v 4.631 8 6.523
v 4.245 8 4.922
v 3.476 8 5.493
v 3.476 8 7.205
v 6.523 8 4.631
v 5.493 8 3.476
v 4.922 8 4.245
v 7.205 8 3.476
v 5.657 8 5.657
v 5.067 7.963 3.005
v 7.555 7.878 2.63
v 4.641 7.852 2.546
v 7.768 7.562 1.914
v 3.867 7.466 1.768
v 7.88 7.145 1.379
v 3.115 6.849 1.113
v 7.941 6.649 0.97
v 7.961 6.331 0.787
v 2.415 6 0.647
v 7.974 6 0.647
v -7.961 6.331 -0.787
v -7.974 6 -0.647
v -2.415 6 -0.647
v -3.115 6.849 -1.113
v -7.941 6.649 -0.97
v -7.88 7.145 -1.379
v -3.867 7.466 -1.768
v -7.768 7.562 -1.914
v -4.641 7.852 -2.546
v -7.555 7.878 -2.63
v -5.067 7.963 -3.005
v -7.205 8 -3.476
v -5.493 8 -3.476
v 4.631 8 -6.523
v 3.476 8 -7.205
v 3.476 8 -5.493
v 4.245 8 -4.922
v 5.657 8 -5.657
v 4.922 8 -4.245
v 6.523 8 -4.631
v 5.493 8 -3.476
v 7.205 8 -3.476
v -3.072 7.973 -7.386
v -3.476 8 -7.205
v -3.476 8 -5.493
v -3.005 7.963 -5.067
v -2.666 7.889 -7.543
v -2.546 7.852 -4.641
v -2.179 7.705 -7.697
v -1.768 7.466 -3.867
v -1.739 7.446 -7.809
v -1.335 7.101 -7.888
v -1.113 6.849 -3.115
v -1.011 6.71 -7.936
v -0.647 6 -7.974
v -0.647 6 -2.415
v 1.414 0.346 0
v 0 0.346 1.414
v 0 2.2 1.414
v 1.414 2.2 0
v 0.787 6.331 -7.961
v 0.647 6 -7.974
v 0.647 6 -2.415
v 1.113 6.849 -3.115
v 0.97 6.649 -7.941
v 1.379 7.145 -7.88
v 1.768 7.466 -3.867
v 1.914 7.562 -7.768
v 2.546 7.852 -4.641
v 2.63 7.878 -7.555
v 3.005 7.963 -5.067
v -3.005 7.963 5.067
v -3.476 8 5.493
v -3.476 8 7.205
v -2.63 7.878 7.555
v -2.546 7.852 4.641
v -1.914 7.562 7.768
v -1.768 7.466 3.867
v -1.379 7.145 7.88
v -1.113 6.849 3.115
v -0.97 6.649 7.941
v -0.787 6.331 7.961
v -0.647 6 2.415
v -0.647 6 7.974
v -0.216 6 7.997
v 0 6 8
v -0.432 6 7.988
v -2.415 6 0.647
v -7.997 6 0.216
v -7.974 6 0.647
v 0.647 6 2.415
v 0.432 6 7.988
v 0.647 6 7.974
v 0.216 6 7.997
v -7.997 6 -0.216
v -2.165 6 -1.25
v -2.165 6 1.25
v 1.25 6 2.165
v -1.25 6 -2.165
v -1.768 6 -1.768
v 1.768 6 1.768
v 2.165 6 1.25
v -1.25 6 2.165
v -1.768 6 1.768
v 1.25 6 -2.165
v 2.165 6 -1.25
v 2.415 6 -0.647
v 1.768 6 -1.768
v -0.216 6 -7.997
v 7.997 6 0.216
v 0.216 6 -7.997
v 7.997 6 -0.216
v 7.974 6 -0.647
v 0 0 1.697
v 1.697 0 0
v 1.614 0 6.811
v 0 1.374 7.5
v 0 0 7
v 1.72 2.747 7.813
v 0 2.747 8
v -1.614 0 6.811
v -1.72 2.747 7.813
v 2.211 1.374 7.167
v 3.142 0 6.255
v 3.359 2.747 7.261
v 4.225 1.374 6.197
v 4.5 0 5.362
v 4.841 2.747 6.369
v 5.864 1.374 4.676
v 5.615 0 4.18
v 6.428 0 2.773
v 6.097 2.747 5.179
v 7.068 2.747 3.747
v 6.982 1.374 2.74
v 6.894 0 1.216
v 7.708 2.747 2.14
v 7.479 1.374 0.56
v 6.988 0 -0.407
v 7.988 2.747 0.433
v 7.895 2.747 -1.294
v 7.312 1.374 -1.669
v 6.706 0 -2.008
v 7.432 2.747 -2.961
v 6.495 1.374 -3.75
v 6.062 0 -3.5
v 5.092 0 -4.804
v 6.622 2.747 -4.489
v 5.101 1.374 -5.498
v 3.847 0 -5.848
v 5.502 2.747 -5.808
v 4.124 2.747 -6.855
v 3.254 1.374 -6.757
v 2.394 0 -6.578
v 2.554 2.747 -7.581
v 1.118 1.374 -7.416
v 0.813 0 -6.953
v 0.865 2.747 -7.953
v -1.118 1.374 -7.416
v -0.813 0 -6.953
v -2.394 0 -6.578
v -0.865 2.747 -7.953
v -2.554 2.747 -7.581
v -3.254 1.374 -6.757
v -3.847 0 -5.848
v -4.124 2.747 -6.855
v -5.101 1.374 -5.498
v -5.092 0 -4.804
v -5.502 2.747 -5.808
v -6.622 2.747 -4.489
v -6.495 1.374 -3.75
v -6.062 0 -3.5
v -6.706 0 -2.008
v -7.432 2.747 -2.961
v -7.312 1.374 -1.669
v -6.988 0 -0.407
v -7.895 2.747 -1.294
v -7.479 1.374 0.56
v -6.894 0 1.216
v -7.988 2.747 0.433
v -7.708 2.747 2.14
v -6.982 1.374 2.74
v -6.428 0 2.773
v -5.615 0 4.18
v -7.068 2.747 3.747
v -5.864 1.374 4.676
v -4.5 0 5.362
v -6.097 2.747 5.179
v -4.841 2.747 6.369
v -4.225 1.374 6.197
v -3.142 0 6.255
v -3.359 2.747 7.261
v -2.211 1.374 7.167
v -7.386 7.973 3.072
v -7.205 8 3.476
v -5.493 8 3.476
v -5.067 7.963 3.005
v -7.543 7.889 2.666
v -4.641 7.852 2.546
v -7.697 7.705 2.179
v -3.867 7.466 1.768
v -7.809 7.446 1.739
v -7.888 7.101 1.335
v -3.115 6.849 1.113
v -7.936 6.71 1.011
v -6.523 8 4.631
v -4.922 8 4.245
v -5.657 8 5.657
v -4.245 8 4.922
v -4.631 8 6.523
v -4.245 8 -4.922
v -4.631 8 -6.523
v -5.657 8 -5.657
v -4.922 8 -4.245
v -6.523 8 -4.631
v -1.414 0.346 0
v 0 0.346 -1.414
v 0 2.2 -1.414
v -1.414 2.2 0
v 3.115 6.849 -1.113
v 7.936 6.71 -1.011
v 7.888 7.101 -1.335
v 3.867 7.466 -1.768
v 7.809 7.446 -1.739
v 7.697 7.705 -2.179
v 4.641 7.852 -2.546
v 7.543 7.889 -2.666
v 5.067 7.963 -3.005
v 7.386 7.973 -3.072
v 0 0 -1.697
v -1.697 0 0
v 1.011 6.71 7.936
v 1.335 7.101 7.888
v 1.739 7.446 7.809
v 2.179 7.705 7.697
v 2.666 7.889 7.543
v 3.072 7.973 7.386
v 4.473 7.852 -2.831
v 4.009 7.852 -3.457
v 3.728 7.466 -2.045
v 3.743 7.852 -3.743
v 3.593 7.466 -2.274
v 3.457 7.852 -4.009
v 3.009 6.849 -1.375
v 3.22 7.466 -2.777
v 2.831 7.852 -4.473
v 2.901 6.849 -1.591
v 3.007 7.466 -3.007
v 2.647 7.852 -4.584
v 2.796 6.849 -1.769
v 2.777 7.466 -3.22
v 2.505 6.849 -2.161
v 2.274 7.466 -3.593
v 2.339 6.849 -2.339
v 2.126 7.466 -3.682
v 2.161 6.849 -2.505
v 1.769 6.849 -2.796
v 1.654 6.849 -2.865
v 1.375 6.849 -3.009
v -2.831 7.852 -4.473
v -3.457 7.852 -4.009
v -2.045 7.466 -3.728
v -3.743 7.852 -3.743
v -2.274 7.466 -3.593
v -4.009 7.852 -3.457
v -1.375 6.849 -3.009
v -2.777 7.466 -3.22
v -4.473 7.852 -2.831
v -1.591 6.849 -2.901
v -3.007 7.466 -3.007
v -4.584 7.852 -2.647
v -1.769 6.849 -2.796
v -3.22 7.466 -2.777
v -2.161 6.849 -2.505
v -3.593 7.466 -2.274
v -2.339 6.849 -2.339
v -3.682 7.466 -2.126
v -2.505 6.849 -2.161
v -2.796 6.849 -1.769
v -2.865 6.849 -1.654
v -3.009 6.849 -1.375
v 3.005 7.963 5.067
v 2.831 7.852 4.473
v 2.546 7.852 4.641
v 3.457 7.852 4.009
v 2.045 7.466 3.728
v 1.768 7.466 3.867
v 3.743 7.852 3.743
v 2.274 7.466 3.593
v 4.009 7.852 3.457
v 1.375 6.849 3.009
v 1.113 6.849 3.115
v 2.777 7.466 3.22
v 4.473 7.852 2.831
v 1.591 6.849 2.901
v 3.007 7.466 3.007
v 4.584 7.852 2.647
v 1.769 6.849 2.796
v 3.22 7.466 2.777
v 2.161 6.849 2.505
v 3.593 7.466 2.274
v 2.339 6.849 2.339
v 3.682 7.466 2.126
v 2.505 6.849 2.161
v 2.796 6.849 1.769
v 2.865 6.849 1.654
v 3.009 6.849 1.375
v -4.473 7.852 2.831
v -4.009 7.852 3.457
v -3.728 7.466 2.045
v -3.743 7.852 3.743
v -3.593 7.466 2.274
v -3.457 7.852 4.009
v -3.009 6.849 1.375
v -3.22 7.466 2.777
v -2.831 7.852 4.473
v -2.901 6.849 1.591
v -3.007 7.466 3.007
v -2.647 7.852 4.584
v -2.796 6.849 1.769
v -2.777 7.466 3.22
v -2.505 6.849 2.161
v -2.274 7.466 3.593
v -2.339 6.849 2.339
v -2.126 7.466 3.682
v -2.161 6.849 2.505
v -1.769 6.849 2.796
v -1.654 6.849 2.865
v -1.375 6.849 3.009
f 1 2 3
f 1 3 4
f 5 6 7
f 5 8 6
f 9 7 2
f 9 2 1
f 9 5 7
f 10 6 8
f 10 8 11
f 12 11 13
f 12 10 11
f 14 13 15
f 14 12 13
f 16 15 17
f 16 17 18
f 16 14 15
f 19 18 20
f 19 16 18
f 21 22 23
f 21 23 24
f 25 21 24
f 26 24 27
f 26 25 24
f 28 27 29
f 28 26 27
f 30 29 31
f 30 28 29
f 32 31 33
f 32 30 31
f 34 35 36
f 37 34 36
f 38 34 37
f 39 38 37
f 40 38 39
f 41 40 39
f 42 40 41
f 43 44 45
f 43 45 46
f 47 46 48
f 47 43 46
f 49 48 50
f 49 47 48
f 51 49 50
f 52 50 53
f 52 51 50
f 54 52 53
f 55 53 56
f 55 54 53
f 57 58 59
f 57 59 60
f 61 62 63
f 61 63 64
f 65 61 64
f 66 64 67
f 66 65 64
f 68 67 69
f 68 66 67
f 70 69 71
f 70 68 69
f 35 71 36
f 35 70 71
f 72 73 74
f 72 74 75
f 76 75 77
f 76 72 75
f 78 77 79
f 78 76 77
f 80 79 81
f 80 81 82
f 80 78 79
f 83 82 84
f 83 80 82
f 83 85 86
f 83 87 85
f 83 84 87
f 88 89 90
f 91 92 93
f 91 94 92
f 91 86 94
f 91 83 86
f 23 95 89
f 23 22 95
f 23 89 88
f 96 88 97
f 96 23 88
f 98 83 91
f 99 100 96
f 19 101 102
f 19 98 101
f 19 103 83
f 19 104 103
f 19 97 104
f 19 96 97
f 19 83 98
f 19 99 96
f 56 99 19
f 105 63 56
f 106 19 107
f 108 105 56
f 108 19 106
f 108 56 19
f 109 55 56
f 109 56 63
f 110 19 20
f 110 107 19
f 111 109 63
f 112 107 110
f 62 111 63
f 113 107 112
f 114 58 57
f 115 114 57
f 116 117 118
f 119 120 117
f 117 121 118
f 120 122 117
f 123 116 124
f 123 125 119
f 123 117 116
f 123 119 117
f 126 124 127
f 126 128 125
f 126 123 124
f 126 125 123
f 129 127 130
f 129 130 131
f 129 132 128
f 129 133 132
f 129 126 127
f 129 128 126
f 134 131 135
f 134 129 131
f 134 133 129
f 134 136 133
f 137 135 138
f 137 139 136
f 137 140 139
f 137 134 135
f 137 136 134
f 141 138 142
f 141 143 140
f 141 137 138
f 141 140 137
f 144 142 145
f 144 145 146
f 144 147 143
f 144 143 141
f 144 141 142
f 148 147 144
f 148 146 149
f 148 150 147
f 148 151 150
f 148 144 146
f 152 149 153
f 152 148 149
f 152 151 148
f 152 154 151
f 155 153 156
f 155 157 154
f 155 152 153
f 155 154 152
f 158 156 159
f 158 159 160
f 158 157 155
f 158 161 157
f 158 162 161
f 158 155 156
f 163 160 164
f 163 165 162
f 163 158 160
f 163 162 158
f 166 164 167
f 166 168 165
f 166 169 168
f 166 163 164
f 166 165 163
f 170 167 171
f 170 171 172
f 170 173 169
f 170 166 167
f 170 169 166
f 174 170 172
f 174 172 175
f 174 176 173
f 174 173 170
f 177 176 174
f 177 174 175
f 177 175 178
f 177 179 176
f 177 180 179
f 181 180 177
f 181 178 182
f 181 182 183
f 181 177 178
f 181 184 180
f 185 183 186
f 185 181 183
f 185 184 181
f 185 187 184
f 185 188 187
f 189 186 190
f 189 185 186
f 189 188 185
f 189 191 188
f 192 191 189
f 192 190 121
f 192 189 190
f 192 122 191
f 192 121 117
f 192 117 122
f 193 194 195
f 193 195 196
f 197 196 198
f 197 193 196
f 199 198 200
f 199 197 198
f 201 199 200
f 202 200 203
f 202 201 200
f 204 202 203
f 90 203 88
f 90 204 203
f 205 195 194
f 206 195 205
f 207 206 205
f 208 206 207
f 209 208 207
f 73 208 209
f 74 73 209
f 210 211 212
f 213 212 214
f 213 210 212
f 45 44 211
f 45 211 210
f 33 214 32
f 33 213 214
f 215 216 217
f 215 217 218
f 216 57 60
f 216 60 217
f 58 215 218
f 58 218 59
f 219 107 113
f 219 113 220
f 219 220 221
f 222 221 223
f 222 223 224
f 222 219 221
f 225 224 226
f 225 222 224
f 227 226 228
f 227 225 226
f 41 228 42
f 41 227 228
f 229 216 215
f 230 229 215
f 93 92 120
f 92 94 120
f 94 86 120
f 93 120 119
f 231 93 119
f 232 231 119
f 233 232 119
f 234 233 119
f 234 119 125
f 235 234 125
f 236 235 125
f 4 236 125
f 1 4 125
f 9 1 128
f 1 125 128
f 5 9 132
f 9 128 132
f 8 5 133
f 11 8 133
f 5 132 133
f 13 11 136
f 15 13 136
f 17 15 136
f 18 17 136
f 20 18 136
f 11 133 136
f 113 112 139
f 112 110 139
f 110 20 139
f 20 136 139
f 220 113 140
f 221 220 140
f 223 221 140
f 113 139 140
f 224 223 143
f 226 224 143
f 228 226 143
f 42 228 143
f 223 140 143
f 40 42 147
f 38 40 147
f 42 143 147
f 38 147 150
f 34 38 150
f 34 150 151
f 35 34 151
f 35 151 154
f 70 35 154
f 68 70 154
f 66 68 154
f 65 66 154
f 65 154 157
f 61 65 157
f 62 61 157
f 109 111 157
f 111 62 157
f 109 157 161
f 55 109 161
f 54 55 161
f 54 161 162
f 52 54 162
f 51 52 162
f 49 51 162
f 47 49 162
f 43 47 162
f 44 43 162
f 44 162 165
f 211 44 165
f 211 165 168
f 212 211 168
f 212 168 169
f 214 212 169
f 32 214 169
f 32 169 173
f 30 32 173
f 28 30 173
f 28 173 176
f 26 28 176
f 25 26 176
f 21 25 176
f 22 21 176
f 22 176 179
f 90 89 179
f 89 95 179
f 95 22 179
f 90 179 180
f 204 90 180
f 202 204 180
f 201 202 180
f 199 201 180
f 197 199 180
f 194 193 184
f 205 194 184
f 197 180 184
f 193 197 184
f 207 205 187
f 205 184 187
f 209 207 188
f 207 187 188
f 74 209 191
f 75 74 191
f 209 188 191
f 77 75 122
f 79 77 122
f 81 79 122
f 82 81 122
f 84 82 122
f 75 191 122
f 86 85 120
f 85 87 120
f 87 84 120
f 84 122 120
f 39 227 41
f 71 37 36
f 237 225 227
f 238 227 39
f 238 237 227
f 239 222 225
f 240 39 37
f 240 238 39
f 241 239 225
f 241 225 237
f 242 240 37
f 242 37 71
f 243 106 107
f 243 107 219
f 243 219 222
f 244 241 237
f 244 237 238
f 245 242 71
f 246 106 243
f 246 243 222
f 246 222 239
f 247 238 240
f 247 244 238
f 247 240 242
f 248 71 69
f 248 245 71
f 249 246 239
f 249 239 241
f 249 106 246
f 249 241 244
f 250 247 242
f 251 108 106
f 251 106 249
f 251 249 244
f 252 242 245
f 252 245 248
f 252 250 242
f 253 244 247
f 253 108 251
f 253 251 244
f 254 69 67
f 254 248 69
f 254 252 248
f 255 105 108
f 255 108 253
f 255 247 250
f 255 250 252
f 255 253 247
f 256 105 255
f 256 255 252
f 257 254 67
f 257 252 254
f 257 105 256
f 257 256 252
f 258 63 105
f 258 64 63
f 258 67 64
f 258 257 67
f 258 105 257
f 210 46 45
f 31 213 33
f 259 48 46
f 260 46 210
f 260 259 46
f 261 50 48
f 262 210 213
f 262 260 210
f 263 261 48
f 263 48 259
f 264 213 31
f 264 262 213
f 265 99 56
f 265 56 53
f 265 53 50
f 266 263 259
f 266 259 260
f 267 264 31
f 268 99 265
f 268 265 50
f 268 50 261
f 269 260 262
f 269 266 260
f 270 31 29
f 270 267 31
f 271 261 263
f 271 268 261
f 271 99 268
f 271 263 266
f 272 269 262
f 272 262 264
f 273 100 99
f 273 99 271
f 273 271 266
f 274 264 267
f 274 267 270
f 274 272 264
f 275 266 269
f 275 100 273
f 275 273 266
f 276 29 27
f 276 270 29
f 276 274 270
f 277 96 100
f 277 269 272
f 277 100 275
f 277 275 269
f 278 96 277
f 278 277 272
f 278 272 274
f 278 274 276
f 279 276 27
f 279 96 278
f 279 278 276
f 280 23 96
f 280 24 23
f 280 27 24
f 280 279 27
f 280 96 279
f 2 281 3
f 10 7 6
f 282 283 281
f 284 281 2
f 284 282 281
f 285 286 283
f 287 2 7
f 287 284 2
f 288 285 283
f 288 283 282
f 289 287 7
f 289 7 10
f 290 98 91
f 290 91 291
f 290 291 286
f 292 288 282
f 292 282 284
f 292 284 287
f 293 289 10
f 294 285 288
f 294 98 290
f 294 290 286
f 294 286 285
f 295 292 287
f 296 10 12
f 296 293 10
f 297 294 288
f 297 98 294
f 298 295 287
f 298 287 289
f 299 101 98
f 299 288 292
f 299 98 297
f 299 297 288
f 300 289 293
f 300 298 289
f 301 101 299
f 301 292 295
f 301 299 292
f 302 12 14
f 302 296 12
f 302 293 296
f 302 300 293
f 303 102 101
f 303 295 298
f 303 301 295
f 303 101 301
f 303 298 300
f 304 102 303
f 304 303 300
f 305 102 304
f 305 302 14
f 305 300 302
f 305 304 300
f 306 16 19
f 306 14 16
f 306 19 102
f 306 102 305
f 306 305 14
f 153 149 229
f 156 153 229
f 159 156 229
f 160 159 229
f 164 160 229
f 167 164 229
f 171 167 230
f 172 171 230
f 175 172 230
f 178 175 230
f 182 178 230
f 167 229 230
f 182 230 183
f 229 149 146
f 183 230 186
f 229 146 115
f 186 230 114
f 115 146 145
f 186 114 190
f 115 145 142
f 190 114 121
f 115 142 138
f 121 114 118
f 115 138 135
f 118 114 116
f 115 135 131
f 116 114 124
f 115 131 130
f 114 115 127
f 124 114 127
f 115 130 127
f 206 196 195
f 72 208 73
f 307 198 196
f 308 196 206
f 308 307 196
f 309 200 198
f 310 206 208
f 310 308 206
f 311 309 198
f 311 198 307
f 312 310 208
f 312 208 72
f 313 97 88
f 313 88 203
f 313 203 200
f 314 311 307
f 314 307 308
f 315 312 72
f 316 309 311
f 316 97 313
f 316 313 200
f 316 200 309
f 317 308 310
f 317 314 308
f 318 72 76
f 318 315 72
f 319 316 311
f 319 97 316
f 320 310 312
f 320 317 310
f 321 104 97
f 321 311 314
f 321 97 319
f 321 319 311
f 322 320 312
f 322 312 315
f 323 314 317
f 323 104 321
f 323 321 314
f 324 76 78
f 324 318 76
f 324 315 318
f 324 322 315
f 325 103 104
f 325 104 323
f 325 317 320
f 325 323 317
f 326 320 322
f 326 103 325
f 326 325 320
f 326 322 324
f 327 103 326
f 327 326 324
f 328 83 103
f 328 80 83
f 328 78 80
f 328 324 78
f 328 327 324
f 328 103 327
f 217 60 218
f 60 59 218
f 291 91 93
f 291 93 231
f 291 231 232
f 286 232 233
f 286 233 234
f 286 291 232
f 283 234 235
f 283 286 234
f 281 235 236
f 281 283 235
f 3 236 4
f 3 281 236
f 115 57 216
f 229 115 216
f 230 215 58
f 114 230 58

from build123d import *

# Parameters (mm, degrees)
SKETCH3_R           = 8
BOSS_EXTRUDE3_DEPTH = 8
CUT_EXTRUDE2_DEPTH  = 2
CUT_EXTRUDE2_DRAFT  = -10
SKETCH7_R           = 2.5
CUT_EXTRUDE4_DEPTH  = 2
FILLET1_R           = 5
FILLET2_START       = -9
FILLET2_DEPTH       = 18
FILLET2_2_DEPTH     = 18
CUT_EXTRUDE5_DEPTH  = 2.2
CHAMFER2_SIZE       = 0.2
CHAMFER2_SIZE2      = 0.346410162
CHAMFER3_SIZE       = 1
CHAMFER3_SIZE2      = 2.747477419


with BuildPart() as part:
    # Sketch3 → Boss-Extrude3 (new body)
    with BuildSketch(Plane(origin=(0, 0, 0), x_dir=(1, 0, 0), z_dir=(0, 1, 0))):
        with Locations(Location((0, 0, 0), (0, 0, 270))):
            Circle(SKETCH3_R)
    extrude(amount=BOSS_EXTRUDE3_DEPTH)


with BuildPart() as cut_extrude2_tool:
    # Sketch4 → Cut-Extrude2 (with draft: the straight prism first)
    with BuildSketch(Plane(origin=(0, 8, 0), x_dir=(1, 0, 0), z_dir=(0, 1, 0))):
        Polygon((-9, -1), (-1, -1), (-1, -9), (1, -9), (1, -1), (9, -1), (9, 1), (1, 1), (1, 9), (-1, 9), (-1, 1), (-9, 1), align=None)
    extrude(amount=-CUT_EXTRUDE2_DEPTH)
    # Cut-Extrude2: the draft: its side faces are tilted about the plane it starts from
    cut_extrude2_sides = [cut_extrude2_tool.faces().sort_by_distance(p)[0] for p in [
        (-5, 7, 1),
        (-1, 7, 5),
        (0, 7, 9),
        (1, 7, 5),
        (5, 7, 1),
        (9, 7, 0),
        (5, 7, -1),
        (1, 7, -5),
        (0, 7, -9),
        (-1, 7, -5),
        (-5, 7, -1),
        (-9, 7, 0),
    ]]
    draft(cut_extrude2_sides, Plane(origin=(0, 8, 0), x_dir=(1, 0, 0), z_dir=(0, 1, 0)), CUT_EXTRUDE2_DRAFT)


with BuildPart() as part_1:
    add(part.part)

    # Cut-Extrude2: cut by cut_extrude2_tool
    add(cut_extrude2_tool.part, mode=Mode.SUBTRACT)

    # Sketch7 → Cut-Extrude4 (cut)
    with BuildSketch(Plane(origin=(0, 8, 0), x_dir=(1, 0, 0), z_dir=(0, 1, 0))):
        Circle(SKETCH7_R)
    extrude(amount=-CUT_EXTRUDE4_DEPTH, mode=Mode.SUBTRACT)

    # Fillet1
    # the kernel refuses this fillet: 5 mm, written as the material it takes off along each edge
    with BuildSketch(Plane(origin=(0, 8, 0), x_dir=(-0.7093247295722765, 0, -0.7048818539423588), z_dir=(0.7048818539423588, 0, -0.7093247295722765))) as fillet1_piece_1:
        with BuildLine():
            CenterArc((6.5, -5), FILLET1_R, 90, 53.130102354)
            Line((2.5, -2), (2.42, -1.94))
            ThreePointArc((2.42, -1.94), (2.4, -1), (2.4, 0))
            Line((2.4, 0), (2.5, 0.1))
            Line((2.5, 0.1), (6.5, 0.1))
            Line((6.5, 0.1), (6.5, 0))
        make_face()
    revolve(axis=Axis((0, 8, 0), (0, 1, 0)), revolution_arc=359.64, mode=Mode.SUBTRACT)
    with BuildSketch(Plane(origin=(0, 8, 0), x_dir=(0.7048818539423484, 0, -0.7093247295722869), z_dir=(0.7093247295722869, 0, 0.7048818539423484))) as fillet1_piece_2:
        with BuildLine():
            CenterArc((6.5, -5), FILLET1_R, 90, 53.130102354)
            Line((2.5, -2), (2.42, -1.94))
            ThreePointArc((2.42, -1.94), (2.4, -1), (2.4, 0))
            Line((2.4, 0), (2.5, 0.1))
            Line((2.5, 0.1), (6.5, 0.1))
            Line((6.5, 0.1), (6.5, 0))
        make_face()
    revolve(axis=Axis((0, 8, 0), (0, 1, 0)), revolution_arc=359.64, mode=Mode.SUBTRACT)
    with BuildSketch(Plane(origin=(0, 8, 0), x_dir=(0.7093247295722607, 0, 0.7048818539423748), z_dir=(-0.7048818539423748, 0, 0.7093247295722607))) as fillet1_piece_3:
        with BuildLine():
            CenterArc((6.5, -5), FILLET1_R, 90, 53.130102354)
            Line((2.5, -2), (2.42, -1.94))
            ThreePointArc((2.42, -1.94), (2.4, -1), (2.4, 0))
            Line((2.4, 0), (2.5, 0.1))
            Line((2.5, 0.1), (6.5, 0.1))
            Line((6.5, 0.1), (6.5, 0))
        make_face()
    revolve(axis=Axis((0, 8, 0), (0, 1, 0)), revolution_arc=359.64, mode=Mode.SUBTRACT)
    with BuildSketch(Plane(origin=(0, 8, 0), x_dir=(-0.704881853942364, 0, 0.7093247295722713), z_dir=(-0.7093247295722713, 0, -0.704881853942364))) as fillet1_piece_4:
        with BuildLine():
            CenterArc((6.5, -5), FILLET1_R, 90, 53.130102354)
            Line((2.5, -2), (2.42, -1.94))
            ThreePointArc((2.42, -1.94), (2.4, -1), (2.4, 0))
            Line((2.4, 0), (2.5, 0.1))
            Line((2.5, 0.1), (6.5, 0.1))
            Line((6.5, 0.1), (6.5, 0))
        make_face()
    revolve(axis=Axis((0, 8, 0), (0, 1, 0)), revolution_arc=359.64, mode=Mode.SUBTRACT)

    # Fillet2: read off the stored shape, not the designer's step
    # Fillet2 outline → Fillet2 (cut)
    with BuildSketch(Plane.XY.offset(FILLET2_START)):
        with BuildLine():
            ThreePointArc((-3.475773163, 8), (-1.743722356, 7.449489743), (-0.647346039, 6))
            Line((-0.647346039, 6), (-1, 8))
            Line((-1, 8), (-3.475773163, 8))
        make_face()
        with BuildLine():
            Line((1, 8), (0.647346039, 6))
            ThreePointArc((0.647346039, 6), (1.743722356, 7.449489743), (3.475773163, 8))
            Line((3.475773163, 8), (1, 8))
        make_face()
    extrude(amount=FILLET2_DEPTH, mode=Mode.SUBTRACT)

    # Fillet2 2 outline → Fillet2 2 (cut)
    with BuildSketch(Plane.YZ.offset(FILLET2_START)):
        with BuildLine():
            ThreePointArc((8, 3.475773163), (7.449489743, 1.743722356), (6, 0.647346039))
            Line((6, 0.647346039), (8, 1))
            Line((8, 1), (8, 3.475773163))
        make_face()
        with BuildLine():
            Line((8, -1), (6, -0.647346039))
            ThreePointArc((6, -0.647346039), (7.449489743, -1.743722356), (8, -3.475773163))
            Line((8, -3.475773163), (8, -1))
        make_face()
    extrude(amount=FILLET2_2_DEPTH, mode=Mode.SUBTRACT)

    # Sketch5 → Cut-Extrude5 (cut)
    with BuildSketch(Plane.XZ):
        Polygon((1.414213562, 0), (0, -1.414213562), (-1.414213562, 0), (0, 1.414213562), align=None)
    extrude(amount=-CUT_EXTRUDE5_DEPTH, mode=Mode.SUBTRACT)

    # Chamfer2
    chamfer2_edges = [part_1.edges().sort_by_distance(p)[0] for p in [
        (0.7071067811865474, 0, 0.7071067811865479),
        (-0.7071067811865476, 0, 0.7071067811865477),
        (-0.7071067811865474, 0, -0.7071067811865474),
        (0.7071067811865477, 0, -0.7071067811865471),
    ]]
    chamfer2_side = [part_1.faces().sort_by_distance(p)[0] for p in [
        (0, 0, -7.77372583),
    ]]
    chamfer(chamfer2_edges, length=CHAMFER2_SIZE, length2=CHAMFER2_SIZE2, reference=chamfer2_side[0])

    # Chamfer3
    chamfer3_edges = [part_1.edges().sort_by_distance(p)[0] for p in [
        (0, 0, -8),
    ]]
    chamfer3_side = [part_1.faces().sort_by_distance(p)[0] for p in [
        (1.008528137, 0, 1.008528137),
    ]]
    chamfer(chamfer3_edges, length=CHAMFER3_SIZE, length2=CHAMFER3_SIZE2, reference=chamfer3_side[0])


solid = part_1.part
